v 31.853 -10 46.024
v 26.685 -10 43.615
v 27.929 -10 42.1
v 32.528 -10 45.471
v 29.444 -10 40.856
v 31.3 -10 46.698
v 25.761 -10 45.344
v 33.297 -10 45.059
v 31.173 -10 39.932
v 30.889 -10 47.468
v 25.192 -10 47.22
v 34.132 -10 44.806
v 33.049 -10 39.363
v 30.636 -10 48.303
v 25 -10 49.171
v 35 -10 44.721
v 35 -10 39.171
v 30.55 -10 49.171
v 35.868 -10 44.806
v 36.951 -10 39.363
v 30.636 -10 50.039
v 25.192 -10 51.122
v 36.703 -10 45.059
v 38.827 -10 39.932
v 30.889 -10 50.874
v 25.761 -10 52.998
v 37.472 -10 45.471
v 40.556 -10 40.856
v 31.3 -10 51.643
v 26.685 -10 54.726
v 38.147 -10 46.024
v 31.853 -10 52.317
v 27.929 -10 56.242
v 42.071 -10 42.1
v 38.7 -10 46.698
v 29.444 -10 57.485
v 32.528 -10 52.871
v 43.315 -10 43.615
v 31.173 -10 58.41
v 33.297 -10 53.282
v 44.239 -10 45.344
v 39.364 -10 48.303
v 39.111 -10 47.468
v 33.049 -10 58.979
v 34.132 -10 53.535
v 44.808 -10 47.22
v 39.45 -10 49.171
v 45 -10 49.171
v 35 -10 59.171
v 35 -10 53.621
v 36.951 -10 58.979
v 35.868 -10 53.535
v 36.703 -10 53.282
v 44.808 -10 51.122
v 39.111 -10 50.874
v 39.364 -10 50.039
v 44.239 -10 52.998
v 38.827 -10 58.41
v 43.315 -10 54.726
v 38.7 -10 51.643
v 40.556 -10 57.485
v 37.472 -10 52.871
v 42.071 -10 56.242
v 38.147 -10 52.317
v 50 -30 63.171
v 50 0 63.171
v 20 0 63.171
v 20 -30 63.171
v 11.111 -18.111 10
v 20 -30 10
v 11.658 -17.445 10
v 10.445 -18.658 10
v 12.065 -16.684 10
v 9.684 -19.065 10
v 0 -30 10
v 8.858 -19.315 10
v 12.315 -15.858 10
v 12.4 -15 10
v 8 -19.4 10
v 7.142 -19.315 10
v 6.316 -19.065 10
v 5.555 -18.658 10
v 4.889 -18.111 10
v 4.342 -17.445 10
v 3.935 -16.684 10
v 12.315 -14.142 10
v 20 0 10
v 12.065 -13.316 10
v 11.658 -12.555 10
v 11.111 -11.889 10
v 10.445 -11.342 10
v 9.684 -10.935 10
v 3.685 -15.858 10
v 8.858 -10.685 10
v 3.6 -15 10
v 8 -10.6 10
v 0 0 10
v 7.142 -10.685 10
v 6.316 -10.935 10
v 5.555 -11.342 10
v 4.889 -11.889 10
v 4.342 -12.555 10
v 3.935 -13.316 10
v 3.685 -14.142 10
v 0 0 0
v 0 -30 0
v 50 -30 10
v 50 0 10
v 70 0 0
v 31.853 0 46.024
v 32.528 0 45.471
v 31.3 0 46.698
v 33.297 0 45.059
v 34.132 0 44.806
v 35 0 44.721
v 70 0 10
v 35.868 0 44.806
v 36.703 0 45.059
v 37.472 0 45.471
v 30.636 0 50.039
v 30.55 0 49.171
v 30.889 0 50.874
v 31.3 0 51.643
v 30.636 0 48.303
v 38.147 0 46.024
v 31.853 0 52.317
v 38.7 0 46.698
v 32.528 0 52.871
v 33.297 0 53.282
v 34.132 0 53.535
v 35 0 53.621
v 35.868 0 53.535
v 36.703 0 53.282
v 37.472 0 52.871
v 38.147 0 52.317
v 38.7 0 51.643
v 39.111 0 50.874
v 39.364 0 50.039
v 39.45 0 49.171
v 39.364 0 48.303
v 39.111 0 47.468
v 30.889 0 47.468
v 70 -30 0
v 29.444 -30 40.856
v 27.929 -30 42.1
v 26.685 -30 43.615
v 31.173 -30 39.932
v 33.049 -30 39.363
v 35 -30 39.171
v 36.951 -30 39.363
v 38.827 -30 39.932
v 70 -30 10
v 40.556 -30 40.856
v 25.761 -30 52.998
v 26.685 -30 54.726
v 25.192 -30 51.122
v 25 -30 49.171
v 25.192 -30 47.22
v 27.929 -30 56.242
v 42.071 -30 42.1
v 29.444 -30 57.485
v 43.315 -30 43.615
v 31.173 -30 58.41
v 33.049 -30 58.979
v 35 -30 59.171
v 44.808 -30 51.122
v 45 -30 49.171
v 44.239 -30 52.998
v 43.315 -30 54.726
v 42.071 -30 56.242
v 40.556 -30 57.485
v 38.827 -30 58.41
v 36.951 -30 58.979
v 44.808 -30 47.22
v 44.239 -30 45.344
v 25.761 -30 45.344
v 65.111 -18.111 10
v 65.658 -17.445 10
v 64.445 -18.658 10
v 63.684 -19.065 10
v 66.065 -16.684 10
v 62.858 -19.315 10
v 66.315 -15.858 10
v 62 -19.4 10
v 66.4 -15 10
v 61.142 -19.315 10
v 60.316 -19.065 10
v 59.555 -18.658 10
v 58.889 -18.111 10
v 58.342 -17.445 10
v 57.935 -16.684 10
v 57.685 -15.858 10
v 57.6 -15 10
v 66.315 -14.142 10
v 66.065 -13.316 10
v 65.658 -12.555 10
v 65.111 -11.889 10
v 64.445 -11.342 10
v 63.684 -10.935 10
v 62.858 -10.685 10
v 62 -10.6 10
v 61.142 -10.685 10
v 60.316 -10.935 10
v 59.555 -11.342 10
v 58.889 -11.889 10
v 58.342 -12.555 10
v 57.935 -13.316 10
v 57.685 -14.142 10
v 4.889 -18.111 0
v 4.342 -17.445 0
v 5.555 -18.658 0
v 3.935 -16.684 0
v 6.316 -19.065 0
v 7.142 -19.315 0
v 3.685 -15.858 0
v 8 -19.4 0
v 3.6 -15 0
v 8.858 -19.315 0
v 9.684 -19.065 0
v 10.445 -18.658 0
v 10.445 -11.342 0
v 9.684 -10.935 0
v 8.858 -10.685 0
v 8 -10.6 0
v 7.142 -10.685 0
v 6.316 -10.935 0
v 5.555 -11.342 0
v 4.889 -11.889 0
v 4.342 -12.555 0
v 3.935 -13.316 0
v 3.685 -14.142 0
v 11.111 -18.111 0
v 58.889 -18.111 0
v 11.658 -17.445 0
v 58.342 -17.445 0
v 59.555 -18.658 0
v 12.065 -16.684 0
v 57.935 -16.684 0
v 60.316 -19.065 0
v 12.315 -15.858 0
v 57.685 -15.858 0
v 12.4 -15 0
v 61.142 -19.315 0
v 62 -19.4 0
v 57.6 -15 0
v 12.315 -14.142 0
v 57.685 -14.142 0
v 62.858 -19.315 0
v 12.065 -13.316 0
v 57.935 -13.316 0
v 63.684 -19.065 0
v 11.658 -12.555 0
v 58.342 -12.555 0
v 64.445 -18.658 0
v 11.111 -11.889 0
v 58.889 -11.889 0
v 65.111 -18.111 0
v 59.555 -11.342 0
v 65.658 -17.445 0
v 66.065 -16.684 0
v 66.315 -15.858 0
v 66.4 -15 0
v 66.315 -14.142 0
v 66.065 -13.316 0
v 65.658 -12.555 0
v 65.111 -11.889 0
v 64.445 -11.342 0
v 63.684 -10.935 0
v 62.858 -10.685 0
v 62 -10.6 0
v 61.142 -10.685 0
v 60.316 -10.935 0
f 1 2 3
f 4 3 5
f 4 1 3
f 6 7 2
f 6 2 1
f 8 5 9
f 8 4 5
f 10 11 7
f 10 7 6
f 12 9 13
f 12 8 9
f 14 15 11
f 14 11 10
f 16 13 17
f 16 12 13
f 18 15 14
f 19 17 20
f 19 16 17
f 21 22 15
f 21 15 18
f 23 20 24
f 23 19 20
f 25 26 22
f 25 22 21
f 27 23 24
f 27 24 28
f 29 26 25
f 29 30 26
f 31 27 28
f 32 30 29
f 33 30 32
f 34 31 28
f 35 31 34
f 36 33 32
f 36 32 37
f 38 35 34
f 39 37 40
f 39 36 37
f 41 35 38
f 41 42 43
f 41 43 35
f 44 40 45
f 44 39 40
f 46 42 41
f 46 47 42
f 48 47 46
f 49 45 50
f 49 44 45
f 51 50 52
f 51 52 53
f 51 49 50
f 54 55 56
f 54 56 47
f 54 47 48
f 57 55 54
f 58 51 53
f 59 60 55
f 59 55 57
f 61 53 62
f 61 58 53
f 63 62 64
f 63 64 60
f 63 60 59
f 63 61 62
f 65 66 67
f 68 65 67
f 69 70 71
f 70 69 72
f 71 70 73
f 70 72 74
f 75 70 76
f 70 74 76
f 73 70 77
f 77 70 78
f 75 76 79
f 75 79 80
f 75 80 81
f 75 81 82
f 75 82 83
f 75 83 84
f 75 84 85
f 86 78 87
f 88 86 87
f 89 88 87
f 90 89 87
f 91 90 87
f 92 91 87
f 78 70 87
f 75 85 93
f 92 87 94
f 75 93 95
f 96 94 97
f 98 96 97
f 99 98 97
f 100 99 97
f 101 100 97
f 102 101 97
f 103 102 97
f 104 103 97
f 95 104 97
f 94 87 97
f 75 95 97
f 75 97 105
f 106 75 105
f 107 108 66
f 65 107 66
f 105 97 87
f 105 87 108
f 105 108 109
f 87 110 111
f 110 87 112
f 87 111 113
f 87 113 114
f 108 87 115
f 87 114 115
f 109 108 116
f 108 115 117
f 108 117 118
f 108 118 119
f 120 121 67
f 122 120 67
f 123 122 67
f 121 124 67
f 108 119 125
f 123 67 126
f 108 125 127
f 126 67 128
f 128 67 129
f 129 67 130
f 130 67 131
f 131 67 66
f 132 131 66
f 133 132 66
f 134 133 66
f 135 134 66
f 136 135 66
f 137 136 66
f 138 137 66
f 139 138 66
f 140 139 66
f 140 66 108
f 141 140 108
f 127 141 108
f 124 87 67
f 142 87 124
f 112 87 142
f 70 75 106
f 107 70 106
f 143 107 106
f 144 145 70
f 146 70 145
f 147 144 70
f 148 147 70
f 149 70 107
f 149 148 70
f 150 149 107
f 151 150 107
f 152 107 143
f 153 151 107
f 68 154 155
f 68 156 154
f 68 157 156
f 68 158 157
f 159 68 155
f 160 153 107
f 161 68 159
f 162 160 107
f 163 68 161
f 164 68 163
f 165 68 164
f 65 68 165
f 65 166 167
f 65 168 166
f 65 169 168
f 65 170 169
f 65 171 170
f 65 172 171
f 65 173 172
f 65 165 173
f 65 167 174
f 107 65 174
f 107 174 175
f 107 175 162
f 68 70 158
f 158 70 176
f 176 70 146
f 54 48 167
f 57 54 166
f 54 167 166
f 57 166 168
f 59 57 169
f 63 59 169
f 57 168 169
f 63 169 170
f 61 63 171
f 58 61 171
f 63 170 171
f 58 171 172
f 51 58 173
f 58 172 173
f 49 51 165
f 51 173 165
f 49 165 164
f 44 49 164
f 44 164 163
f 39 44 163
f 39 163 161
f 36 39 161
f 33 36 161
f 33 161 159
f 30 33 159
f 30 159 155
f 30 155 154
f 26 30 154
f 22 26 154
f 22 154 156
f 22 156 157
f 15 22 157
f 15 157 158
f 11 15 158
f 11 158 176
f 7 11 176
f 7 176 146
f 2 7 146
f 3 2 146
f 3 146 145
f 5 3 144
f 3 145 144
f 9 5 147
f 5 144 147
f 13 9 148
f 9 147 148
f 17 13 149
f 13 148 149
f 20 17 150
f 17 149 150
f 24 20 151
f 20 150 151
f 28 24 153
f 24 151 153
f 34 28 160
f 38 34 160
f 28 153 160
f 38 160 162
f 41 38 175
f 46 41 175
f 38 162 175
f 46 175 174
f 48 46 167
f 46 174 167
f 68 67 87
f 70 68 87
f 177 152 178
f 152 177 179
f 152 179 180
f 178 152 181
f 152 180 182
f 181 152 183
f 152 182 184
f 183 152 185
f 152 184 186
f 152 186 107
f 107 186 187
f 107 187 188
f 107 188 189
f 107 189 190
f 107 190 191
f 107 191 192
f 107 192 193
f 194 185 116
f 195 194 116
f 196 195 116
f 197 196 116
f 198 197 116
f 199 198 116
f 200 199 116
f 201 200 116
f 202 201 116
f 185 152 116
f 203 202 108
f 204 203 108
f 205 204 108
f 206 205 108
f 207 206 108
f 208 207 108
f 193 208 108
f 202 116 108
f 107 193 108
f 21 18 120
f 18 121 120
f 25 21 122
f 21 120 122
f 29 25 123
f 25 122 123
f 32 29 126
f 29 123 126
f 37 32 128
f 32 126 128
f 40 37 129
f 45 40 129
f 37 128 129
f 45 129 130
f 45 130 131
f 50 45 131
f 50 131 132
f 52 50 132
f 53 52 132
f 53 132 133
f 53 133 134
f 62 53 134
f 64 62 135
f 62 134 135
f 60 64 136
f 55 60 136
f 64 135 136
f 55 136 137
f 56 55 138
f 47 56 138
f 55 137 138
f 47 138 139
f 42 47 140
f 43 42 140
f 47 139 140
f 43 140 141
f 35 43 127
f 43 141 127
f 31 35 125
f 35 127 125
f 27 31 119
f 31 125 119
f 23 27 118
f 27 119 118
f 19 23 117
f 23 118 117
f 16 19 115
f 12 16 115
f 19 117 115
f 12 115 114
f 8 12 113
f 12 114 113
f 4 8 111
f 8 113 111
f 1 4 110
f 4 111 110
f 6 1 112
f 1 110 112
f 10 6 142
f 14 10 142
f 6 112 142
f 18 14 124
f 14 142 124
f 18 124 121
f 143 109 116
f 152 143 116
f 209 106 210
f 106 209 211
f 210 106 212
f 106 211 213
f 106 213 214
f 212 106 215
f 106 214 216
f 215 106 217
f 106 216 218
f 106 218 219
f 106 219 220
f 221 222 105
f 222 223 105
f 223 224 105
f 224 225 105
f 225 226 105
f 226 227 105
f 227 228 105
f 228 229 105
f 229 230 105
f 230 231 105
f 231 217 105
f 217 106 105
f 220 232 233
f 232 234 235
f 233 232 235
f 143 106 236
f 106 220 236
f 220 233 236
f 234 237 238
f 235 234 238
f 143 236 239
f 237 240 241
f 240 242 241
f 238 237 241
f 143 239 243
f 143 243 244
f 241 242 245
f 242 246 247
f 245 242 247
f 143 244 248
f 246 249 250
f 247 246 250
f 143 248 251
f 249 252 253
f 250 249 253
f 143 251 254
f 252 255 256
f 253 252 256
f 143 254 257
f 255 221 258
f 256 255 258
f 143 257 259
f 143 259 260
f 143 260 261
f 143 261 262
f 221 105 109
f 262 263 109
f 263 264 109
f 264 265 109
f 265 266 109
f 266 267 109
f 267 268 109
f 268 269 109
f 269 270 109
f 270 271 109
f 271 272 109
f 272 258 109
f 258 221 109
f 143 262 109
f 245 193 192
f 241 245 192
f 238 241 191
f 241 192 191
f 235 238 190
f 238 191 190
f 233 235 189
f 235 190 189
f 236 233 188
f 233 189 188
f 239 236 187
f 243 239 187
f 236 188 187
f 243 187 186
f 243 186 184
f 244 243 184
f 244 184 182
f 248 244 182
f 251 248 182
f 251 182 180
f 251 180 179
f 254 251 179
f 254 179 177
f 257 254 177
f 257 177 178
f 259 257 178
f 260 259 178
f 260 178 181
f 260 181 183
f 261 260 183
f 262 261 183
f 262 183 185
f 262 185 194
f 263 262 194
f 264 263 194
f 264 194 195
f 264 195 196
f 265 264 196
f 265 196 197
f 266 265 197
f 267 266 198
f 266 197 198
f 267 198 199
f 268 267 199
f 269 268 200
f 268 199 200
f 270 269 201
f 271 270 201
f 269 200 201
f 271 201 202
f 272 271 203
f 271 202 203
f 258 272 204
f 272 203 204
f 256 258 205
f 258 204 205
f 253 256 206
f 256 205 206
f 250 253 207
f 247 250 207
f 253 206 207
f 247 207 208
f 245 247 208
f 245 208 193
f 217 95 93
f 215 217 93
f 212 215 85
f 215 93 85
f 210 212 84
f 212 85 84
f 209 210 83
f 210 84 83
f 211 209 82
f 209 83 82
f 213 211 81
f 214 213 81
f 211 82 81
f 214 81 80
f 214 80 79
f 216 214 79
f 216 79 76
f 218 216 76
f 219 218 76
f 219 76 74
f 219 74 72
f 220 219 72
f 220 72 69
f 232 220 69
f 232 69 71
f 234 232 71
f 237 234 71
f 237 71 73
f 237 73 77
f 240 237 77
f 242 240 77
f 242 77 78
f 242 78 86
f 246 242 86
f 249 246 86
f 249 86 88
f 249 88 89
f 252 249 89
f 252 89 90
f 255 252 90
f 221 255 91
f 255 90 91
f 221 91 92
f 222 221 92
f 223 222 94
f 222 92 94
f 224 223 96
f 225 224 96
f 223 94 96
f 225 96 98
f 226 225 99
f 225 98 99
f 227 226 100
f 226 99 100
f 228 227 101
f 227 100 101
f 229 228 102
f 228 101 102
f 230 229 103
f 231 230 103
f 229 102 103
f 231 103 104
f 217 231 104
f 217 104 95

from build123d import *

# Parameters (mm, degrees)
F1_DEPTH       = 30
F3_D           = 8.9
F3_CBORE_D     = 20
F3_CBORE_DEPTH = 20
F5_D           = 8.8


with BuildPart() as f1:
    # F0 (on Front) → F1 (new body)
    with BuildSketch(Plane.XZ):
        Polygon((0, 10), (0, 0), (70, 0), (70, 10), (50, 10), (50, 63.1707229285), (20, 63.1707229285), (20, 10), align=None)
    extrude(amount=F1_DEPTH)

    # F3 (through all)
    with Locations(Plane.XZ.offset(30)):
        with Locations((35, 49.1707229285)):
            CounterBoreHole(F3_D / 2, F3_CBORE_D / 2, F3_CBORE_DEPTH)

    # F5 (through all)
    with Locations(Plane(origin=(0, 0, 0), x_dir=(1, 0, 0), z_dir=(0, 0, -1))):
        with Locations((8, 15), (62, 15)):
            Hole(F5_D / 2)


solid = f1.part
